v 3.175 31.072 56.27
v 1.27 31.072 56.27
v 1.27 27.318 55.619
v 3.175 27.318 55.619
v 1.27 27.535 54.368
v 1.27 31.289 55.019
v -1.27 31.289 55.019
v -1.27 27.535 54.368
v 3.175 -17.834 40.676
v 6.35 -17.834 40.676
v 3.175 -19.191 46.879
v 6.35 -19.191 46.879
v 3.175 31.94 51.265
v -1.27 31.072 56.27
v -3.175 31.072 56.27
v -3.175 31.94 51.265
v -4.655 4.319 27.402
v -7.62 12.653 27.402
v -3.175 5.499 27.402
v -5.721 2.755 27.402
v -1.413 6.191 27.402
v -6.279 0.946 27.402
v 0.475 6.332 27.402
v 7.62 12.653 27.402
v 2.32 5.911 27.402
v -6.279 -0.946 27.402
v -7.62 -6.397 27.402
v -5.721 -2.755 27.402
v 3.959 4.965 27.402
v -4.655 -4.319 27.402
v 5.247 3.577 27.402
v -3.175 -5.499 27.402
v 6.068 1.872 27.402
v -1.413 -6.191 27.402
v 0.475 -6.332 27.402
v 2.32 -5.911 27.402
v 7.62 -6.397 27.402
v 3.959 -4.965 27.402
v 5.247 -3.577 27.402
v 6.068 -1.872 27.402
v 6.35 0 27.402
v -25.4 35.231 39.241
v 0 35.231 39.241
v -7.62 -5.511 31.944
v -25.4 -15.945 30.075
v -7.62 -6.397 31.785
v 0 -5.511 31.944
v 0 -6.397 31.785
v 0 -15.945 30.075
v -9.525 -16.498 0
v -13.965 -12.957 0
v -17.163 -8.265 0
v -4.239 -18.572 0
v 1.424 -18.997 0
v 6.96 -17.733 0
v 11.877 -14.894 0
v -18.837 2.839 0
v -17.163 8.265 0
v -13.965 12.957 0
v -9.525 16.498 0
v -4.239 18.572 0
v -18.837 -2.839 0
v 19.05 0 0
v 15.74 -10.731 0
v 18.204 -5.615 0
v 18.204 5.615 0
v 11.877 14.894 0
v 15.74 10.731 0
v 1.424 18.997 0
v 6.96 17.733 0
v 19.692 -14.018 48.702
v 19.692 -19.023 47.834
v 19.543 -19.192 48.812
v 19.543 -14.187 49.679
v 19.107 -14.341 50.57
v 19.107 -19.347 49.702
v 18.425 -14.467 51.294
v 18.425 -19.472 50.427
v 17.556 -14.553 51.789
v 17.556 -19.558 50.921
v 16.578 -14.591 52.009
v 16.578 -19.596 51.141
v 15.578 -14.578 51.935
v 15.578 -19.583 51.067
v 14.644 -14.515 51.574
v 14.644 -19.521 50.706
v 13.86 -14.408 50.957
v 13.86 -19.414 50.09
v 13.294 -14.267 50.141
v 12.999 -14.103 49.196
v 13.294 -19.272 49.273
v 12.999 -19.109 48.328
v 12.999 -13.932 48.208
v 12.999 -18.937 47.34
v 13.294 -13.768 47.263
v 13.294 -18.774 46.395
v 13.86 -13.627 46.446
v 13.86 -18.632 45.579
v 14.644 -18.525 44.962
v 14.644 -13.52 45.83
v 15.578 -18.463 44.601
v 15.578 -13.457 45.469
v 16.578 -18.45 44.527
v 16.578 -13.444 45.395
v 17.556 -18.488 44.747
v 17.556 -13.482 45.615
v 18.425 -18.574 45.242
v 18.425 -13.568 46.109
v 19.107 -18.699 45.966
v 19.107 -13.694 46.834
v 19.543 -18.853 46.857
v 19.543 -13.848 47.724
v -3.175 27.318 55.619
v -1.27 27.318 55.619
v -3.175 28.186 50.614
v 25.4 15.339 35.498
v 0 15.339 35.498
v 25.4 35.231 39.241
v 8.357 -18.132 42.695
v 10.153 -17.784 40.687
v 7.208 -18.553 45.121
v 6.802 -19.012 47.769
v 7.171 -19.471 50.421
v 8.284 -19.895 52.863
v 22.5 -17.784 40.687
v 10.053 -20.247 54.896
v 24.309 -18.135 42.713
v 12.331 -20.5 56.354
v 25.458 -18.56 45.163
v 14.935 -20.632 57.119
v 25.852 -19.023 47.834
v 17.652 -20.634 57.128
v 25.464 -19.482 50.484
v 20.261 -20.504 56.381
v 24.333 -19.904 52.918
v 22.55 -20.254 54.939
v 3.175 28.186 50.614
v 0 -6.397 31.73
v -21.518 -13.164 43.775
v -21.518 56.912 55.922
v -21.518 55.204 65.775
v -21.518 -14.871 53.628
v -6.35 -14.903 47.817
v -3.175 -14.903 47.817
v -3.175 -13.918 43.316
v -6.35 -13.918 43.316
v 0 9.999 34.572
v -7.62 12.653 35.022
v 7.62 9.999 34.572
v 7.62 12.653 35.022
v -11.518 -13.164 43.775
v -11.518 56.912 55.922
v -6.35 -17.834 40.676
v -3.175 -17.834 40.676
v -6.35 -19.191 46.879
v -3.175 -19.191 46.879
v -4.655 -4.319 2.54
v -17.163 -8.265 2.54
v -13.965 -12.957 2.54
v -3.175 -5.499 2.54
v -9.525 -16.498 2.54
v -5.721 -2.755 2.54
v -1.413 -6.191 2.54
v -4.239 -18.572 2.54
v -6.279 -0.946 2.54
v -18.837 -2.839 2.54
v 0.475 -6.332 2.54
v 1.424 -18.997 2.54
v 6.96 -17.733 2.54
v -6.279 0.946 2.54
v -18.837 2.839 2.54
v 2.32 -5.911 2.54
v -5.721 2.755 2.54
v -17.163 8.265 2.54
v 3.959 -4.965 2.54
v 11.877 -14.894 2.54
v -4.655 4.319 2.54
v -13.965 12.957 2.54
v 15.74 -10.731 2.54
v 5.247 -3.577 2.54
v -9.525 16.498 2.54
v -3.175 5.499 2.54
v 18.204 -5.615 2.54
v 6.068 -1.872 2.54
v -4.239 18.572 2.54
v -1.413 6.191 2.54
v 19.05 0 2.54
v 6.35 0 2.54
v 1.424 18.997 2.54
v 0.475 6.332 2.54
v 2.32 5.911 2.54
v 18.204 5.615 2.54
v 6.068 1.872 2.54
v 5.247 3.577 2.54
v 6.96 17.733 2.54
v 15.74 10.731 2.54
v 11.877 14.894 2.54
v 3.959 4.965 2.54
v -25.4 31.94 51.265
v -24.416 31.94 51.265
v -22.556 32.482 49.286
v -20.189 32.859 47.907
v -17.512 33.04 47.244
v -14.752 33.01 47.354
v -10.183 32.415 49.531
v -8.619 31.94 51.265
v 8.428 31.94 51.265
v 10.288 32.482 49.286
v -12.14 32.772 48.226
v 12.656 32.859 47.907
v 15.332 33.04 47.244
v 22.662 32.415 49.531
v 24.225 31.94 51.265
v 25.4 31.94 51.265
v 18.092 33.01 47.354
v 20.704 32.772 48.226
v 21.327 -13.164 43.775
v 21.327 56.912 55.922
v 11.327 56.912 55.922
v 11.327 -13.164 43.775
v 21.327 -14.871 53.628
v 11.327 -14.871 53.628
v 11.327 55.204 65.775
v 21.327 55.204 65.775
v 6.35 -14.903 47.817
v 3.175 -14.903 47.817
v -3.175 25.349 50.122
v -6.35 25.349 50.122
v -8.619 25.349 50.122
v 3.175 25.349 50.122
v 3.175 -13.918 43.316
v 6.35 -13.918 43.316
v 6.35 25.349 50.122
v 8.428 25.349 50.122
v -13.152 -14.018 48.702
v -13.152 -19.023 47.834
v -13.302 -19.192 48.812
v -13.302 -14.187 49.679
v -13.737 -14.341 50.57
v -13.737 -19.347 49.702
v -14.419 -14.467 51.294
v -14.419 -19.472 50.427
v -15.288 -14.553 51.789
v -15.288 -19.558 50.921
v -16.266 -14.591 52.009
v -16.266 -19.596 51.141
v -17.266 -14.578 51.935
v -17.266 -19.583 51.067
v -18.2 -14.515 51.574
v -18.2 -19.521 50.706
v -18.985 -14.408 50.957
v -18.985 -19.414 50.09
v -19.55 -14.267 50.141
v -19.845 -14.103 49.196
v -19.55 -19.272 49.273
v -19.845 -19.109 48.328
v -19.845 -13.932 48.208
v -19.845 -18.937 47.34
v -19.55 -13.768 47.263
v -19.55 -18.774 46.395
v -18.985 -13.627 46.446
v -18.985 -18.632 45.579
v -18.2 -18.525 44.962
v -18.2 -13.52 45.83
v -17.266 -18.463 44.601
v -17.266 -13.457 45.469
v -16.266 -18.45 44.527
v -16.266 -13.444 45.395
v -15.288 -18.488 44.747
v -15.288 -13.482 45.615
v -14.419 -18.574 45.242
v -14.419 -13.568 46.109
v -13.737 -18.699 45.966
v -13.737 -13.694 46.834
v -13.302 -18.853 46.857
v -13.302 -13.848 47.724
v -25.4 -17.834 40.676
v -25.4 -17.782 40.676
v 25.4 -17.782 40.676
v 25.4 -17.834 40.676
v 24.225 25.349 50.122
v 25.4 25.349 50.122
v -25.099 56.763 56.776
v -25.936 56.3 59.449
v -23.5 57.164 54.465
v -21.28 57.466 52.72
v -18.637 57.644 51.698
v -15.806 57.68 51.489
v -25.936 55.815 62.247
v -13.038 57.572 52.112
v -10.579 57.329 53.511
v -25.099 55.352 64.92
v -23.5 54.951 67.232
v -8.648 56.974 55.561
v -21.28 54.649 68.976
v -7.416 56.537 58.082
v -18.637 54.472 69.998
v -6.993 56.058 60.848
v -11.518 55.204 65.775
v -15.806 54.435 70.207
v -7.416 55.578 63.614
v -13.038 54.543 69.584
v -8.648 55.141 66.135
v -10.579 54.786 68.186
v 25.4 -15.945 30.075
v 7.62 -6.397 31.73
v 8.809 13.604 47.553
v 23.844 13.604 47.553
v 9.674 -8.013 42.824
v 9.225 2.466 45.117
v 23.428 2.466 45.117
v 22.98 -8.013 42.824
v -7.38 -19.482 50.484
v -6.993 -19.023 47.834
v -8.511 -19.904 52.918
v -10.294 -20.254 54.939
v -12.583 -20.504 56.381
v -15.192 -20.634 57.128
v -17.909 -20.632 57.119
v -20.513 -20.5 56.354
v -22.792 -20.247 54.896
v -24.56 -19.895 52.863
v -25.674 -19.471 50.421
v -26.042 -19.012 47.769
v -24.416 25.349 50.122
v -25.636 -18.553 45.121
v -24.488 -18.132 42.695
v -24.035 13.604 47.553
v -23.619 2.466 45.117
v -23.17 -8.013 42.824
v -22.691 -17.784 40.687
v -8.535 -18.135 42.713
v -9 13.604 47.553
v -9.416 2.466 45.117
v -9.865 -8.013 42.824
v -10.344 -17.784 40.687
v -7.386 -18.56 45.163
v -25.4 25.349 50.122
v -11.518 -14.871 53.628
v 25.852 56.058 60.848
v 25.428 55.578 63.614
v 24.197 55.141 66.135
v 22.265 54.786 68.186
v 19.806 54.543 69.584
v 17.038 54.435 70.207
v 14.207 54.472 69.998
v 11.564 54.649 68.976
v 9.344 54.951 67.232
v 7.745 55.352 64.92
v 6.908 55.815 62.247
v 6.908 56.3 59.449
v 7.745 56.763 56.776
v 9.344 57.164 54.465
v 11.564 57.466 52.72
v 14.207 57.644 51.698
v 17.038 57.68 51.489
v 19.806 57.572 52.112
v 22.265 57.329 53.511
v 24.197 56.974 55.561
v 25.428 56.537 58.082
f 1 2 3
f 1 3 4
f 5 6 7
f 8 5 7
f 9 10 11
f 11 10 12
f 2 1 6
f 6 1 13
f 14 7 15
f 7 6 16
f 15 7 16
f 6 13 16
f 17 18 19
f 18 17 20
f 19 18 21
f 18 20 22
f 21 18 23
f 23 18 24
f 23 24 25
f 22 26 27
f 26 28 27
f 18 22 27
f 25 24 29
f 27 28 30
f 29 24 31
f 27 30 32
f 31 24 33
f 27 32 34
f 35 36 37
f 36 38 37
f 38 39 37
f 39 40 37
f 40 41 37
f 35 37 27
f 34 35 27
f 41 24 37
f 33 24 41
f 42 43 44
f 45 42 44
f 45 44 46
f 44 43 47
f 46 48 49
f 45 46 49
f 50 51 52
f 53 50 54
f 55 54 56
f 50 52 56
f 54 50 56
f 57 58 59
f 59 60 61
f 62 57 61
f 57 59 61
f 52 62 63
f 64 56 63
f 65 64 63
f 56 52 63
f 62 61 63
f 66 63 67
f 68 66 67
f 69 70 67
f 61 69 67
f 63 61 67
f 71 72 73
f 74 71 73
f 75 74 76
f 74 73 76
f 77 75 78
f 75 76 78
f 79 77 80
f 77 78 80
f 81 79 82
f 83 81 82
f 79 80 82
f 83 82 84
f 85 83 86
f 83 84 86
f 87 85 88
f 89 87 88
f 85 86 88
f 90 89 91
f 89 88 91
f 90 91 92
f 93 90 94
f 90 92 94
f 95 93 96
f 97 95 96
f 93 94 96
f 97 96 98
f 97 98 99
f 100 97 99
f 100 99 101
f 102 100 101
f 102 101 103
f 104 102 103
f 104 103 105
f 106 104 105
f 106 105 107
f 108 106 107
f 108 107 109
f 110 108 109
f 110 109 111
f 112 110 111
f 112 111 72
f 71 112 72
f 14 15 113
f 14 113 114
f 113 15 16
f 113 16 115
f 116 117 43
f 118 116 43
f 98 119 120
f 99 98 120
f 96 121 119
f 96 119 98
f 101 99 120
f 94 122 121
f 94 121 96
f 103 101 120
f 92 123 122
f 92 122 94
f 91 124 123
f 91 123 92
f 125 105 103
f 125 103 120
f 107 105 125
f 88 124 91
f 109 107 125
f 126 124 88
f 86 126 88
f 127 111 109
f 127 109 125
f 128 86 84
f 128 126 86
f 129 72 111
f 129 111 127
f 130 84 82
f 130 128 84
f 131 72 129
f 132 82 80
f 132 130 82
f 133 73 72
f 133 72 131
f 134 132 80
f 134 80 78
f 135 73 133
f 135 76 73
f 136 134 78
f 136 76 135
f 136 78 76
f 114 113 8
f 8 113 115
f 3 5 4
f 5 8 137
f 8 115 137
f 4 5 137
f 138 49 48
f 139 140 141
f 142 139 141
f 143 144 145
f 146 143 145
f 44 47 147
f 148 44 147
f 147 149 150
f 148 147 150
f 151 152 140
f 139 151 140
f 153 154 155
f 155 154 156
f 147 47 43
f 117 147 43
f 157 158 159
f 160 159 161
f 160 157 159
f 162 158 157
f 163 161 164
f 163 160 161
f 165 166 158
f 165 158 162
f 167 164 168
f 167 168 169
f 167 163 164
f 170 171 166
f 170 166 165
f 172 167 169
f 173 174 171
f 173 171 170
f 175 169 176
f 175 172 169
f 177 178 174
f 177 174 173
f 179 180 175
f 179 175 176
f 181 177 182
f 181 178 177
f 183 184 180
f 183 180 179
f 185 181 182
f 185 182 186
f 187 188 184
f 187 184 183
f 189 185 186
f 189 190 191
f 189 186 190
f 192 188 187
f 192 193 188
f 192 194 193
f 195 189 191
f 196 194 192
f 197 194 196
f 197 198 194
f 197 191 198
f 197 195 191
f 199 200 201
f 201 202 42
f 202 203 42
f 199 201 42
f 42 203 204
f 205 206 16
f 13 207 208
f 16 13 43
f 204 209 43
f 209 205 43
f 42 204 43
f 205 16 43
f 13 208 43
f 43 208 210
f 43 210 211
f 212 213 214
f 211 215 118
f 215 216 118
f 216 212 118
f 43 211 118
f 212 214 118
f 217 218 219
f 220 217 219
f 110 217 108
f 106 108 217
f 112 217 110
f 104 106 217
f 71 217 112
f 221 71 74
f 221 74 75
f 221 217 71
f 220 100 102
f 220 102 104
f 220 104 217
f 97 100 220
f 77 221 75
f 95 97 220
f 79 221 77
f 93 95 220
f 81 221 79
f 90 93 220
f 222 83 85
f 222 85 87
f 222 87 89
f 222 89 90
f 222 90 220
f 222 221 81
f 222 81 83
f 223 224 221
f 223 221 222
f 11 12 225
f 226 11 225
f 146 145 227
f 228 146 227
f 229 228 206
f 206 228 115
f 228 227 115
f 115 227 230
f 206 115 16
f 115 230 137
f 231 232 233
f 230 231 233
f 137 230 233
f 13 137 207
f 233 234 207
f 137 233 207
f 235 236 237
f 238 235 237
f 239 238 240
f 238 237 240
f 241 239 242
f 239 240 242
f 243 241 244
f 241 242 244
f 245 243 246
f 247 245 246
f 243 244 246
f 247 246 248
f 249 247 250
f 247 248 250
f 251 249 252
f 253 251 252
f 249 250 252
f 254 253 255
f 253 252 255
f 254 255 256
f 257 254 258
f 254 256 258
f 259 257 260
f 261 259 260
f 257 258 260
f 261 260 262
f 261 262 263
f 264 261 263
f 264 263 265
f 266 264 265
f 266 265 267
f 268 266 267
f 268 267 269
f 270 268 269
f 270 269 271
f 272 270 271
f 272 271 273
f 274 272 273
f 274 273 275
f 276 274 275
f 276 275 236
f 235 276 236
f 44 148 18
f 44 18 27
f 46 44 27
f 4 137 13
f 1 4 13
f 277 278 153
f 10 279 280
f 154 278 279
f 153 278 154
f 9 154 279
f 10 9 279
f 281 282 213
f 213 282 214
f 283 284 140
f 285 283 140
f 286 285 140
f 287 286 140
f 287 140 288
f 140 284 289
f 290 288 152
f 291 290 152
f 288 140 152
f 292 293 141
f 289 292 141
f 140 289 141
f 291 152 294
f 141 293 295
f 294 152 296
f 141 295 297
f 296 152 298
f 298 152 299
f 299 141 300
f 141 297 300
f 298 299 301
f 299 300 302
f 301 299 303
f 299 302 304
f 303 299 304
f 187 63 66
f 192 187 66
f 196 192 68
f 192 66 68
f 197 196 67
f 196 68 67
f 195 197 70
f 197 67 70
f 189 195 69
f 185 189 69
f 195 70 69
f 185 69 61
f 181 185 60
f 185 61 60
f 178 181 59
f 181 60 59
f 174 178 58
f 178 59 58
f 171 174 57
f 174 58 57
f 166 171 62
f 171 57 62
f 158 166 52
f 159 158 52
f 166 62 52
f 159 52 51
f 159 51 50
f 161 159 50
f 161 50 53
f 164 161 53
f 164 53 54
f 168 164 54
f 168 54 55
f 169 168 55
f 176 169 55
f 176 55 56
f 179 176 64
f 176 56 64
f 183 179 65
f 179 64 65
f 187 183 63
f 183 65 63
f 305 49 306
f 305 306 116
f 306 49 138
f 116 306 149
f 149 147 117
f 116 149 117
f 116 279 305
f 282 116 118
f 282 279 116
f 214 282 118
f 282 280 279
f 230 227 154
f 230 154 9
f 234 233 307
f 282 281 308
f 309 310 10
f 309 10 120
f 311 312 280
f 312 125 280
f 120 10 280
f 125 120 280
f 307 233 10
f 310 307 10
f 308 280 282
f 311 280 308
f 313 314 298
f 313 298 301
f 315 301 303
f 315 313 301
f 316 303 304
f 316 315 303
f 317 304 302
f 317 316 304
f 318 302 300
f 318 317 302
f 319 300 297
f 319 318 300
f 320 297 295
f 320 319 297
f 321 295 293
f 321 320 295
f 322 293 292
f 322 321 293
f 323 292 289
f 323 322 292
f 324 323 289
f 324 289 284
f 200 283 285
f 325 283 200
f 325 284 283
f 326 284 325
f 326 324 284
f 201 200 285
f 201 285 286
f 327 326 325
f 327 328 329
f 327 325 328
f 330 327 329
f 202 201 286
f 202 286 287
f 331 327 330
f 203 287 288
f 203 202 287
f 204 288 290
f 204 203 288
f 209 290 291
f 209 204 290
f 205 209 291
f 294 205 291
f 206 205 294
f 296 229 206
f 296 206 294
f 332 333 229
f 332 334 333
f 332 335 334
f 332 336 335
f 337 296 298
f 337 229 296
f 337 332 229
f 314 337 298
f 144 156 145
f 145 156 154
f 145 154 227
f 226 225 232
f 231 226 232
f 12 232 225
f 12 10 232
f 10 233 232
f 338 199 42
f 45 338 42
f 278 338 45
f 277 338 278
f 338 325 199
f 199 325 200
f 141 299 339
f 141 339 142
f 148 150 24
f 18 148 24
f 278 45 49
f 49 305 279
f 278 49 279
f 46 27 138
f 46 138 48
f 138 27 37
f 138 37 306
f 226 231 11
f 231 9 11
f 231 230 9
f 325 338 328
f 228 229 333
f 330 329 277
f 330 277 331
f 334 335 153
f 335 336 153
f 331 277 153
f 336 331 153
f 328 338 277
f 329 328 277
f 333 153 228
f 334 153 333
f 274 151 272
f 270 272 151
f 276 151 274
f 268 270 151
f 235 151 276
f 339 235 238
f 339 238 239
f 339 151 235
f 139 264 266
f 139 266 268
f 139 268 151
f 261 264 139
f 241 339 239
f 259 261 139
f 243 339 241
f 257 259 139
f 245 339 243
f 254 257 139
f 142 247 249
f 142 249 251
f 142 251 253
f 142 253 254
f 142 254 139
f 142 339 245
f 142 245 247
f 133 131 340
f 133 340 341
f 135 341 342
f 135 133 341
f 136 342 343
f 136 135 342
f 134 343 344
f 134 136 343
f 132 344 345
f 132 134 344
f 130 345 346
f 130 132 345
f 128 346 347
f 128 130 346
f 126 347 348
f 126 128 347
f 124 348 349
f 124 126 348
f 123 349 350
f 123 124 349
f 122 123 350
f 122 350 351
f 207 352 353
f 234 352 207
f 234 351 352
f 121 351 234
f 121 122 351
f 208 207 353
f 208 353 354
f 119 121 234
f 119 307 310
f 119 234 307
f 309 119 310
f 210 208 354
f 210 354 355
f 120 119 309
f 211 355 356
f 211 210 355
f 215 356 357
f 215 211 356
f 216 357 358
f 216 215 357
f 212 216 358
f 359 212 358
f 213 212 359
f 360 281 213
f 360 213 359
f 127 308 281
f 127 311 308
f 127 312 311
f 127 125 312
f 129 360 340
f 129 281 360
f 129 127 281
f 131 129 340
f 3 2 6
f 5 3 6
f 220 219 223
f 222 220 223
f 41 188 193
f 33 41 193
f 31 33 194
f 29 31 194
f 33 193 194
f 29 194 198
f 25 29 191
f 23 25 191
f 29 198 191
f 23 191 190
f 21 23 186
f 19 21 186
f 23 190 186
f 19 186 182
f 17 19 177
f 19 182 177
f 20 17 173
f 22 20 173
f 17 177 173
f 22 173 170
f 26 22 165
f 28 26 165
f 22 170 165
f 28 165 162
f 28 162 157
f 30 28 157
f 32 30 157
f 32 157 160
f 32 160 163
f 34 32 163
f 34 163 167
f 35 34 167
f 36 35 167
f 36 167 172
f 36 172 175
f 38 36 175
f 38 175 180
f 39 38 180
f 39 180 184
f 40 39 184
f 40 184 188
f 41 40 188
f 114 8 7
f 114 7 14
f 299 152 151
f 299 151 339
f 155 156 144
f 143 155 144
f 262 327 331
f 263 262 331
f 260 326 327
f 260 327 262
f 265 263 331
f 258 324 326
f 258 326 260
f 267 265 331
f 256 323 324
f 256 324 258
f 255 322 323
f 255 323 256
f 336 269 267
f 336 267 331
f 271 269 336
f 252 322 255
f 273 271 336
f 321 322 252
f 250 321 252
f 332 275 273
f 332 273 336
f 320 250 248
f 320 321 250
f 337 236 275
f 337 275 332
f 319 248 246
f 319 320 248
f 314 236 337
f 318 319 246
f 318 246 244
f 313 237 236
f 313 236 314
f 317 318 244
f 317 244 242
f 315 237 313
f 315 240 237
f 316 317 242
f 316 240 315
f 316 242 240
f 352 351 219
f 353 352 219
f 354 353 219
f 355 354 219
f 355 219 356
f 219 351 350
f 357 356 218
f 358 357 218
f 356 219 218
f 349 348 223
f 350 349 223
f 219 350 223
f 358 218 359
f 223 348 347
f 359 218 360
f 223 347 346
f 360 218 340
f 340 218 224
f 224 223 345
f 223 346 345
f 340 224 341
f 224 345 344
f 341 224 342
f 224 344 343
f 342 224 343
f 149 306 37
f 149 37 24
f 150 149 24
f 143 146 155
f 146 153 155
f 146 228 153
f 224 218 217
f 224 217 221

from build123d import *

# Parameters (mm, degrees)
F0_R      = 19.05
F1_DEPTH  = 2.54
F2_R      = 6.35
F3_DEPTH  = 25.4
F5_DEPTH  = 7.62
F7_DEPTH  = 7.62
F9_DEPTH  = 25.4
F11_DEPTH = 25.4
F13_DEPTH = 25.4
F15_DEPTH = 25.4
F16_W     = 19.05
F16_H     = 6.35
F17_DEPTH = 50.8
F18_W     = 19.05
F18_H     = 6.35
F19_DEPTH = 50.8
F21_DEPTH = 50.8
F23_DEPTH = 5.08
F25_DEPTH = 25.4
F26_R     = 9.525
F27_DEPTH = 76.2
F29_W     = 10
F29_H     = 10
F30_DEPTH = 71.12
F28_W     = 10
F28_H     = 10
F31_DEPTH = 71.12
F33_R     = 3.3655
F32_R     = 3.3655
F34_DEPTH = 25.4


with BuildPart() as f1:
    # F0 (on Top) → F1 (new body)
    with BuildSketch(Plane.XY):
        Circle(F0_R)
    extrude(amount=F1_DEPTH)

    # F2 (on face) → F3 (join)
    with BuildSketch(Plane.XY.offset(2.54)):
        Circle(F2_R)
    extrude(amount=F3_DEPTH)

    # F4 (on Right) → F5 (join)
    with BuildSketch(Plane.YZ):
        Polygon((-6.3969814219, 31.7939482629), (-6.3969814219, 27.4019930512), (12.6530185781, 27.4019930512), (12.6530185781, 35.0219930512), align=None)
    extrude(amount=F5_DEPTH)

    # F6 (on face) → F7 (join)
    with BuildSketch(Plane(origin=(0, 0, 0), x_dir=(0, -1, 0), z_dir=(-1, 0, 0))):
        Polygon((-12.6530185781, 35.0219930512), (-12.6530185781, 27.4019930512), (6.3969814219, 27.4019930512), (6.3969814219, 31.7939482629), align=None)
    extrude(amount=F7_DEPTH)

    # F8 (on Right) → F9 (join)
    with BuildSketch(Plane.YZ):
        Polygon((-15.9447137266, 30.0753582269), (15.3388162634, 35.4978347242), (35.2311320603, 39.2411798239), (31.9399436585, 51.2647326185), (-18.1137043255, 42.5887702229), align=None)
    extrude(amount=F9_DEPTH)

    # F10 (on face) → F11 (join)
    with BuildSketch(Plane(origin=(0, 0, 0), x_dir=(0, -1, 0), z_dir=(-1, 0, 0))):
        Polygon((-31.9399436585, 51.2647326185), (-35.2311320603, 39.2411798239), (15.9447137266, 30.0753582269), (18.1137043255, 42.5887702229), align=None)
    extrude(amount=F11_DEPTH)

    # F12 (on Right) → F13 (join)
    with BuildSketch(Plane.YZ):
        Polygon((-19.1909428686, 46.8793660402), (-17.8339676882, 40.6760509298), (-13.3405660695, 40.6760509298), (-14.9027385279, 47.8174107397), align=None)
    extrude(amount=F13_DEPTH)

    # F14 (on face) → F15 (join)
    with BuildSketch(Plane(origin=(0, 0, 0), x_dir=(0, -1, 0), z_dir=(-1, 0, 0))):
        Polygon((13.3405660695, 40.6760509298), (17.8339676882, 40.6760509298), (19.1909428686, 46.8793660402), (14.9027385279, 47.8174107397), align=None)
    extrude(amount=F15_DEPTH)

    # F16 (on face) → F17 (cut)
    with BuildSketch(Plane(origin=(0, -8.528003266, -1.8655007144), x_dir=(1, 0, 0), z_dir=(0, -0.9769000174, -0.2136968788))):
        with Locations((-15.875, 46.7224980926)):
            Rectangle(F16_W, F16_H)
    extrude(amount=-F17_DEPTH, mode=Mode.SUBTRACT)

    # F18 (on face) → F19 (cut)
    with BuildSketch(Plane(origin=(0, -8.528003266, -1.8655007144), x_dir=(1, 0, 0), z_dir=(0, -0.9769000174, -0.2136968788))):
        with Locations((15.875, 46.7224980926)):
            Rectangle(F18_W, F18_H)
    extrude(amount=-F19_DEPTH, mode=Mode.SUBTRACT)

    # F20 (on face) → F21 (cut)
    with BuildSketch(Plane(origin=(0, -8.528003266, -1.8655007144), x_dir=(1, 0, 0), z_dir=(0, -0.9769000174, -0.2136968788))):
        Polygon((3.175, 49.8974980926), (0, 49.8974980926), (-3.175, 49.8974980926), (-3.175, 43.5474980926), (3.175, 43.5474980926), align=None)
    extrude(amount=-F21_DEPTH, mode=Mode.SUBTRACT)

    # F22 (on face) → F23 (join)
    with BuildSketch(Plane(origin=(0, -7.6950725058, 44.3946657275), x_dir=(1, 0, 0), z_dir=(0, -0.1707866613, 0.9853080312))):
        Polygon((3.175, 40.2260155302), (0, 40.2260155302), (-3.175, 40.2260155302), (-3.175, 36.4160155302), (3.175, 36.4160155302), align=None)
    extrude(amount=F23_DEPTH)

    # F24 (on face) → F25 (cut)
    with BuildSketch(Plane(origin=(0, 39.6350161643, 6.870066891), x_dir=(-1, 0, 0), z_dir=(0, 0.9853080312, 0.1707866613))):
        Polygon((1.27, 50.1366364249), (0, 50.1366364249), (-1.27, 50.1366364249), (-1.27, 48.8666364249), (1.27, 48.8666364249), align=None)
    extrude(amount=-F25_DEPTH, mode=Mode.SUBTRACT)

    # F26 (on face) → F27 (join)
    with BuildSketch(Plane(origin=(0, -10.4186318197, -1.8058955046), x_dir=(1, 0, 0), z_dir=(0, -0.9853080312, -0.1707866613))):
        with Locations((-16.5175776929, 50.3802224994)):
            Circle(F26_R)
        with Locations((16.3266230375, 50.3802224994)):
            Circle(F26_R)
    extrude(amount=-F27_DEPTH)

    # F29 (on face) → F30 (cut)
    with BuildSketch(Plane(origin=(0, 64.6618401563, 11.2080480889), x_dir=(-1, 0, 0), z_dir=(0, 0.9853080312, 0.1707866613))):
        with Locations((16.5175776929, 50.3802224994)):
            Rectangle(F29_W, F29_H)
    extrude(amount=-F30_DEPTH, mode=Mode.SUBTRACT)

    # F28 (on face) → F31 (cut)
    with BuildSketch(Plane(origin=(0, 64.6618401563, 11.2080480889), x_dir=(-1, 0, 0), z_dir=(0, 0.9853080312, 0.1707866613))):
        with Locations((-16.3266230375, 50.3802224994)):
            Rectangle(F28_W, F28_H)
    extrude(amount=-F31_DEPTH, mode=Mode.SUBTRACT)

    # F33 (on face) + F32 (on face) → F34 (cut)
    with BuildSketch(Plane(origin=(0, -10.4186318197, -1.8058955046), x_dir=(1, 0, 0), z_dir=(0, -0.9853080312, -0.1707866613))):
        with Locations((16.3266230375, 50.3802224994)):
            Circle(F33_R)
    with BuildSketch(Plane(origin=(0, -10.4186318197, -1.8058955046), x_dir=(1, 0, 0), z_dir=(0, -0.9853080312, -0.1707866613))):
        with Locations((-16.5175776929, 50.3802224994)):
            Circle(F32_R)
    extrude(amount=-F34_DEPTH, mode=Mode.SUBTRACT)


solid = f1.part
